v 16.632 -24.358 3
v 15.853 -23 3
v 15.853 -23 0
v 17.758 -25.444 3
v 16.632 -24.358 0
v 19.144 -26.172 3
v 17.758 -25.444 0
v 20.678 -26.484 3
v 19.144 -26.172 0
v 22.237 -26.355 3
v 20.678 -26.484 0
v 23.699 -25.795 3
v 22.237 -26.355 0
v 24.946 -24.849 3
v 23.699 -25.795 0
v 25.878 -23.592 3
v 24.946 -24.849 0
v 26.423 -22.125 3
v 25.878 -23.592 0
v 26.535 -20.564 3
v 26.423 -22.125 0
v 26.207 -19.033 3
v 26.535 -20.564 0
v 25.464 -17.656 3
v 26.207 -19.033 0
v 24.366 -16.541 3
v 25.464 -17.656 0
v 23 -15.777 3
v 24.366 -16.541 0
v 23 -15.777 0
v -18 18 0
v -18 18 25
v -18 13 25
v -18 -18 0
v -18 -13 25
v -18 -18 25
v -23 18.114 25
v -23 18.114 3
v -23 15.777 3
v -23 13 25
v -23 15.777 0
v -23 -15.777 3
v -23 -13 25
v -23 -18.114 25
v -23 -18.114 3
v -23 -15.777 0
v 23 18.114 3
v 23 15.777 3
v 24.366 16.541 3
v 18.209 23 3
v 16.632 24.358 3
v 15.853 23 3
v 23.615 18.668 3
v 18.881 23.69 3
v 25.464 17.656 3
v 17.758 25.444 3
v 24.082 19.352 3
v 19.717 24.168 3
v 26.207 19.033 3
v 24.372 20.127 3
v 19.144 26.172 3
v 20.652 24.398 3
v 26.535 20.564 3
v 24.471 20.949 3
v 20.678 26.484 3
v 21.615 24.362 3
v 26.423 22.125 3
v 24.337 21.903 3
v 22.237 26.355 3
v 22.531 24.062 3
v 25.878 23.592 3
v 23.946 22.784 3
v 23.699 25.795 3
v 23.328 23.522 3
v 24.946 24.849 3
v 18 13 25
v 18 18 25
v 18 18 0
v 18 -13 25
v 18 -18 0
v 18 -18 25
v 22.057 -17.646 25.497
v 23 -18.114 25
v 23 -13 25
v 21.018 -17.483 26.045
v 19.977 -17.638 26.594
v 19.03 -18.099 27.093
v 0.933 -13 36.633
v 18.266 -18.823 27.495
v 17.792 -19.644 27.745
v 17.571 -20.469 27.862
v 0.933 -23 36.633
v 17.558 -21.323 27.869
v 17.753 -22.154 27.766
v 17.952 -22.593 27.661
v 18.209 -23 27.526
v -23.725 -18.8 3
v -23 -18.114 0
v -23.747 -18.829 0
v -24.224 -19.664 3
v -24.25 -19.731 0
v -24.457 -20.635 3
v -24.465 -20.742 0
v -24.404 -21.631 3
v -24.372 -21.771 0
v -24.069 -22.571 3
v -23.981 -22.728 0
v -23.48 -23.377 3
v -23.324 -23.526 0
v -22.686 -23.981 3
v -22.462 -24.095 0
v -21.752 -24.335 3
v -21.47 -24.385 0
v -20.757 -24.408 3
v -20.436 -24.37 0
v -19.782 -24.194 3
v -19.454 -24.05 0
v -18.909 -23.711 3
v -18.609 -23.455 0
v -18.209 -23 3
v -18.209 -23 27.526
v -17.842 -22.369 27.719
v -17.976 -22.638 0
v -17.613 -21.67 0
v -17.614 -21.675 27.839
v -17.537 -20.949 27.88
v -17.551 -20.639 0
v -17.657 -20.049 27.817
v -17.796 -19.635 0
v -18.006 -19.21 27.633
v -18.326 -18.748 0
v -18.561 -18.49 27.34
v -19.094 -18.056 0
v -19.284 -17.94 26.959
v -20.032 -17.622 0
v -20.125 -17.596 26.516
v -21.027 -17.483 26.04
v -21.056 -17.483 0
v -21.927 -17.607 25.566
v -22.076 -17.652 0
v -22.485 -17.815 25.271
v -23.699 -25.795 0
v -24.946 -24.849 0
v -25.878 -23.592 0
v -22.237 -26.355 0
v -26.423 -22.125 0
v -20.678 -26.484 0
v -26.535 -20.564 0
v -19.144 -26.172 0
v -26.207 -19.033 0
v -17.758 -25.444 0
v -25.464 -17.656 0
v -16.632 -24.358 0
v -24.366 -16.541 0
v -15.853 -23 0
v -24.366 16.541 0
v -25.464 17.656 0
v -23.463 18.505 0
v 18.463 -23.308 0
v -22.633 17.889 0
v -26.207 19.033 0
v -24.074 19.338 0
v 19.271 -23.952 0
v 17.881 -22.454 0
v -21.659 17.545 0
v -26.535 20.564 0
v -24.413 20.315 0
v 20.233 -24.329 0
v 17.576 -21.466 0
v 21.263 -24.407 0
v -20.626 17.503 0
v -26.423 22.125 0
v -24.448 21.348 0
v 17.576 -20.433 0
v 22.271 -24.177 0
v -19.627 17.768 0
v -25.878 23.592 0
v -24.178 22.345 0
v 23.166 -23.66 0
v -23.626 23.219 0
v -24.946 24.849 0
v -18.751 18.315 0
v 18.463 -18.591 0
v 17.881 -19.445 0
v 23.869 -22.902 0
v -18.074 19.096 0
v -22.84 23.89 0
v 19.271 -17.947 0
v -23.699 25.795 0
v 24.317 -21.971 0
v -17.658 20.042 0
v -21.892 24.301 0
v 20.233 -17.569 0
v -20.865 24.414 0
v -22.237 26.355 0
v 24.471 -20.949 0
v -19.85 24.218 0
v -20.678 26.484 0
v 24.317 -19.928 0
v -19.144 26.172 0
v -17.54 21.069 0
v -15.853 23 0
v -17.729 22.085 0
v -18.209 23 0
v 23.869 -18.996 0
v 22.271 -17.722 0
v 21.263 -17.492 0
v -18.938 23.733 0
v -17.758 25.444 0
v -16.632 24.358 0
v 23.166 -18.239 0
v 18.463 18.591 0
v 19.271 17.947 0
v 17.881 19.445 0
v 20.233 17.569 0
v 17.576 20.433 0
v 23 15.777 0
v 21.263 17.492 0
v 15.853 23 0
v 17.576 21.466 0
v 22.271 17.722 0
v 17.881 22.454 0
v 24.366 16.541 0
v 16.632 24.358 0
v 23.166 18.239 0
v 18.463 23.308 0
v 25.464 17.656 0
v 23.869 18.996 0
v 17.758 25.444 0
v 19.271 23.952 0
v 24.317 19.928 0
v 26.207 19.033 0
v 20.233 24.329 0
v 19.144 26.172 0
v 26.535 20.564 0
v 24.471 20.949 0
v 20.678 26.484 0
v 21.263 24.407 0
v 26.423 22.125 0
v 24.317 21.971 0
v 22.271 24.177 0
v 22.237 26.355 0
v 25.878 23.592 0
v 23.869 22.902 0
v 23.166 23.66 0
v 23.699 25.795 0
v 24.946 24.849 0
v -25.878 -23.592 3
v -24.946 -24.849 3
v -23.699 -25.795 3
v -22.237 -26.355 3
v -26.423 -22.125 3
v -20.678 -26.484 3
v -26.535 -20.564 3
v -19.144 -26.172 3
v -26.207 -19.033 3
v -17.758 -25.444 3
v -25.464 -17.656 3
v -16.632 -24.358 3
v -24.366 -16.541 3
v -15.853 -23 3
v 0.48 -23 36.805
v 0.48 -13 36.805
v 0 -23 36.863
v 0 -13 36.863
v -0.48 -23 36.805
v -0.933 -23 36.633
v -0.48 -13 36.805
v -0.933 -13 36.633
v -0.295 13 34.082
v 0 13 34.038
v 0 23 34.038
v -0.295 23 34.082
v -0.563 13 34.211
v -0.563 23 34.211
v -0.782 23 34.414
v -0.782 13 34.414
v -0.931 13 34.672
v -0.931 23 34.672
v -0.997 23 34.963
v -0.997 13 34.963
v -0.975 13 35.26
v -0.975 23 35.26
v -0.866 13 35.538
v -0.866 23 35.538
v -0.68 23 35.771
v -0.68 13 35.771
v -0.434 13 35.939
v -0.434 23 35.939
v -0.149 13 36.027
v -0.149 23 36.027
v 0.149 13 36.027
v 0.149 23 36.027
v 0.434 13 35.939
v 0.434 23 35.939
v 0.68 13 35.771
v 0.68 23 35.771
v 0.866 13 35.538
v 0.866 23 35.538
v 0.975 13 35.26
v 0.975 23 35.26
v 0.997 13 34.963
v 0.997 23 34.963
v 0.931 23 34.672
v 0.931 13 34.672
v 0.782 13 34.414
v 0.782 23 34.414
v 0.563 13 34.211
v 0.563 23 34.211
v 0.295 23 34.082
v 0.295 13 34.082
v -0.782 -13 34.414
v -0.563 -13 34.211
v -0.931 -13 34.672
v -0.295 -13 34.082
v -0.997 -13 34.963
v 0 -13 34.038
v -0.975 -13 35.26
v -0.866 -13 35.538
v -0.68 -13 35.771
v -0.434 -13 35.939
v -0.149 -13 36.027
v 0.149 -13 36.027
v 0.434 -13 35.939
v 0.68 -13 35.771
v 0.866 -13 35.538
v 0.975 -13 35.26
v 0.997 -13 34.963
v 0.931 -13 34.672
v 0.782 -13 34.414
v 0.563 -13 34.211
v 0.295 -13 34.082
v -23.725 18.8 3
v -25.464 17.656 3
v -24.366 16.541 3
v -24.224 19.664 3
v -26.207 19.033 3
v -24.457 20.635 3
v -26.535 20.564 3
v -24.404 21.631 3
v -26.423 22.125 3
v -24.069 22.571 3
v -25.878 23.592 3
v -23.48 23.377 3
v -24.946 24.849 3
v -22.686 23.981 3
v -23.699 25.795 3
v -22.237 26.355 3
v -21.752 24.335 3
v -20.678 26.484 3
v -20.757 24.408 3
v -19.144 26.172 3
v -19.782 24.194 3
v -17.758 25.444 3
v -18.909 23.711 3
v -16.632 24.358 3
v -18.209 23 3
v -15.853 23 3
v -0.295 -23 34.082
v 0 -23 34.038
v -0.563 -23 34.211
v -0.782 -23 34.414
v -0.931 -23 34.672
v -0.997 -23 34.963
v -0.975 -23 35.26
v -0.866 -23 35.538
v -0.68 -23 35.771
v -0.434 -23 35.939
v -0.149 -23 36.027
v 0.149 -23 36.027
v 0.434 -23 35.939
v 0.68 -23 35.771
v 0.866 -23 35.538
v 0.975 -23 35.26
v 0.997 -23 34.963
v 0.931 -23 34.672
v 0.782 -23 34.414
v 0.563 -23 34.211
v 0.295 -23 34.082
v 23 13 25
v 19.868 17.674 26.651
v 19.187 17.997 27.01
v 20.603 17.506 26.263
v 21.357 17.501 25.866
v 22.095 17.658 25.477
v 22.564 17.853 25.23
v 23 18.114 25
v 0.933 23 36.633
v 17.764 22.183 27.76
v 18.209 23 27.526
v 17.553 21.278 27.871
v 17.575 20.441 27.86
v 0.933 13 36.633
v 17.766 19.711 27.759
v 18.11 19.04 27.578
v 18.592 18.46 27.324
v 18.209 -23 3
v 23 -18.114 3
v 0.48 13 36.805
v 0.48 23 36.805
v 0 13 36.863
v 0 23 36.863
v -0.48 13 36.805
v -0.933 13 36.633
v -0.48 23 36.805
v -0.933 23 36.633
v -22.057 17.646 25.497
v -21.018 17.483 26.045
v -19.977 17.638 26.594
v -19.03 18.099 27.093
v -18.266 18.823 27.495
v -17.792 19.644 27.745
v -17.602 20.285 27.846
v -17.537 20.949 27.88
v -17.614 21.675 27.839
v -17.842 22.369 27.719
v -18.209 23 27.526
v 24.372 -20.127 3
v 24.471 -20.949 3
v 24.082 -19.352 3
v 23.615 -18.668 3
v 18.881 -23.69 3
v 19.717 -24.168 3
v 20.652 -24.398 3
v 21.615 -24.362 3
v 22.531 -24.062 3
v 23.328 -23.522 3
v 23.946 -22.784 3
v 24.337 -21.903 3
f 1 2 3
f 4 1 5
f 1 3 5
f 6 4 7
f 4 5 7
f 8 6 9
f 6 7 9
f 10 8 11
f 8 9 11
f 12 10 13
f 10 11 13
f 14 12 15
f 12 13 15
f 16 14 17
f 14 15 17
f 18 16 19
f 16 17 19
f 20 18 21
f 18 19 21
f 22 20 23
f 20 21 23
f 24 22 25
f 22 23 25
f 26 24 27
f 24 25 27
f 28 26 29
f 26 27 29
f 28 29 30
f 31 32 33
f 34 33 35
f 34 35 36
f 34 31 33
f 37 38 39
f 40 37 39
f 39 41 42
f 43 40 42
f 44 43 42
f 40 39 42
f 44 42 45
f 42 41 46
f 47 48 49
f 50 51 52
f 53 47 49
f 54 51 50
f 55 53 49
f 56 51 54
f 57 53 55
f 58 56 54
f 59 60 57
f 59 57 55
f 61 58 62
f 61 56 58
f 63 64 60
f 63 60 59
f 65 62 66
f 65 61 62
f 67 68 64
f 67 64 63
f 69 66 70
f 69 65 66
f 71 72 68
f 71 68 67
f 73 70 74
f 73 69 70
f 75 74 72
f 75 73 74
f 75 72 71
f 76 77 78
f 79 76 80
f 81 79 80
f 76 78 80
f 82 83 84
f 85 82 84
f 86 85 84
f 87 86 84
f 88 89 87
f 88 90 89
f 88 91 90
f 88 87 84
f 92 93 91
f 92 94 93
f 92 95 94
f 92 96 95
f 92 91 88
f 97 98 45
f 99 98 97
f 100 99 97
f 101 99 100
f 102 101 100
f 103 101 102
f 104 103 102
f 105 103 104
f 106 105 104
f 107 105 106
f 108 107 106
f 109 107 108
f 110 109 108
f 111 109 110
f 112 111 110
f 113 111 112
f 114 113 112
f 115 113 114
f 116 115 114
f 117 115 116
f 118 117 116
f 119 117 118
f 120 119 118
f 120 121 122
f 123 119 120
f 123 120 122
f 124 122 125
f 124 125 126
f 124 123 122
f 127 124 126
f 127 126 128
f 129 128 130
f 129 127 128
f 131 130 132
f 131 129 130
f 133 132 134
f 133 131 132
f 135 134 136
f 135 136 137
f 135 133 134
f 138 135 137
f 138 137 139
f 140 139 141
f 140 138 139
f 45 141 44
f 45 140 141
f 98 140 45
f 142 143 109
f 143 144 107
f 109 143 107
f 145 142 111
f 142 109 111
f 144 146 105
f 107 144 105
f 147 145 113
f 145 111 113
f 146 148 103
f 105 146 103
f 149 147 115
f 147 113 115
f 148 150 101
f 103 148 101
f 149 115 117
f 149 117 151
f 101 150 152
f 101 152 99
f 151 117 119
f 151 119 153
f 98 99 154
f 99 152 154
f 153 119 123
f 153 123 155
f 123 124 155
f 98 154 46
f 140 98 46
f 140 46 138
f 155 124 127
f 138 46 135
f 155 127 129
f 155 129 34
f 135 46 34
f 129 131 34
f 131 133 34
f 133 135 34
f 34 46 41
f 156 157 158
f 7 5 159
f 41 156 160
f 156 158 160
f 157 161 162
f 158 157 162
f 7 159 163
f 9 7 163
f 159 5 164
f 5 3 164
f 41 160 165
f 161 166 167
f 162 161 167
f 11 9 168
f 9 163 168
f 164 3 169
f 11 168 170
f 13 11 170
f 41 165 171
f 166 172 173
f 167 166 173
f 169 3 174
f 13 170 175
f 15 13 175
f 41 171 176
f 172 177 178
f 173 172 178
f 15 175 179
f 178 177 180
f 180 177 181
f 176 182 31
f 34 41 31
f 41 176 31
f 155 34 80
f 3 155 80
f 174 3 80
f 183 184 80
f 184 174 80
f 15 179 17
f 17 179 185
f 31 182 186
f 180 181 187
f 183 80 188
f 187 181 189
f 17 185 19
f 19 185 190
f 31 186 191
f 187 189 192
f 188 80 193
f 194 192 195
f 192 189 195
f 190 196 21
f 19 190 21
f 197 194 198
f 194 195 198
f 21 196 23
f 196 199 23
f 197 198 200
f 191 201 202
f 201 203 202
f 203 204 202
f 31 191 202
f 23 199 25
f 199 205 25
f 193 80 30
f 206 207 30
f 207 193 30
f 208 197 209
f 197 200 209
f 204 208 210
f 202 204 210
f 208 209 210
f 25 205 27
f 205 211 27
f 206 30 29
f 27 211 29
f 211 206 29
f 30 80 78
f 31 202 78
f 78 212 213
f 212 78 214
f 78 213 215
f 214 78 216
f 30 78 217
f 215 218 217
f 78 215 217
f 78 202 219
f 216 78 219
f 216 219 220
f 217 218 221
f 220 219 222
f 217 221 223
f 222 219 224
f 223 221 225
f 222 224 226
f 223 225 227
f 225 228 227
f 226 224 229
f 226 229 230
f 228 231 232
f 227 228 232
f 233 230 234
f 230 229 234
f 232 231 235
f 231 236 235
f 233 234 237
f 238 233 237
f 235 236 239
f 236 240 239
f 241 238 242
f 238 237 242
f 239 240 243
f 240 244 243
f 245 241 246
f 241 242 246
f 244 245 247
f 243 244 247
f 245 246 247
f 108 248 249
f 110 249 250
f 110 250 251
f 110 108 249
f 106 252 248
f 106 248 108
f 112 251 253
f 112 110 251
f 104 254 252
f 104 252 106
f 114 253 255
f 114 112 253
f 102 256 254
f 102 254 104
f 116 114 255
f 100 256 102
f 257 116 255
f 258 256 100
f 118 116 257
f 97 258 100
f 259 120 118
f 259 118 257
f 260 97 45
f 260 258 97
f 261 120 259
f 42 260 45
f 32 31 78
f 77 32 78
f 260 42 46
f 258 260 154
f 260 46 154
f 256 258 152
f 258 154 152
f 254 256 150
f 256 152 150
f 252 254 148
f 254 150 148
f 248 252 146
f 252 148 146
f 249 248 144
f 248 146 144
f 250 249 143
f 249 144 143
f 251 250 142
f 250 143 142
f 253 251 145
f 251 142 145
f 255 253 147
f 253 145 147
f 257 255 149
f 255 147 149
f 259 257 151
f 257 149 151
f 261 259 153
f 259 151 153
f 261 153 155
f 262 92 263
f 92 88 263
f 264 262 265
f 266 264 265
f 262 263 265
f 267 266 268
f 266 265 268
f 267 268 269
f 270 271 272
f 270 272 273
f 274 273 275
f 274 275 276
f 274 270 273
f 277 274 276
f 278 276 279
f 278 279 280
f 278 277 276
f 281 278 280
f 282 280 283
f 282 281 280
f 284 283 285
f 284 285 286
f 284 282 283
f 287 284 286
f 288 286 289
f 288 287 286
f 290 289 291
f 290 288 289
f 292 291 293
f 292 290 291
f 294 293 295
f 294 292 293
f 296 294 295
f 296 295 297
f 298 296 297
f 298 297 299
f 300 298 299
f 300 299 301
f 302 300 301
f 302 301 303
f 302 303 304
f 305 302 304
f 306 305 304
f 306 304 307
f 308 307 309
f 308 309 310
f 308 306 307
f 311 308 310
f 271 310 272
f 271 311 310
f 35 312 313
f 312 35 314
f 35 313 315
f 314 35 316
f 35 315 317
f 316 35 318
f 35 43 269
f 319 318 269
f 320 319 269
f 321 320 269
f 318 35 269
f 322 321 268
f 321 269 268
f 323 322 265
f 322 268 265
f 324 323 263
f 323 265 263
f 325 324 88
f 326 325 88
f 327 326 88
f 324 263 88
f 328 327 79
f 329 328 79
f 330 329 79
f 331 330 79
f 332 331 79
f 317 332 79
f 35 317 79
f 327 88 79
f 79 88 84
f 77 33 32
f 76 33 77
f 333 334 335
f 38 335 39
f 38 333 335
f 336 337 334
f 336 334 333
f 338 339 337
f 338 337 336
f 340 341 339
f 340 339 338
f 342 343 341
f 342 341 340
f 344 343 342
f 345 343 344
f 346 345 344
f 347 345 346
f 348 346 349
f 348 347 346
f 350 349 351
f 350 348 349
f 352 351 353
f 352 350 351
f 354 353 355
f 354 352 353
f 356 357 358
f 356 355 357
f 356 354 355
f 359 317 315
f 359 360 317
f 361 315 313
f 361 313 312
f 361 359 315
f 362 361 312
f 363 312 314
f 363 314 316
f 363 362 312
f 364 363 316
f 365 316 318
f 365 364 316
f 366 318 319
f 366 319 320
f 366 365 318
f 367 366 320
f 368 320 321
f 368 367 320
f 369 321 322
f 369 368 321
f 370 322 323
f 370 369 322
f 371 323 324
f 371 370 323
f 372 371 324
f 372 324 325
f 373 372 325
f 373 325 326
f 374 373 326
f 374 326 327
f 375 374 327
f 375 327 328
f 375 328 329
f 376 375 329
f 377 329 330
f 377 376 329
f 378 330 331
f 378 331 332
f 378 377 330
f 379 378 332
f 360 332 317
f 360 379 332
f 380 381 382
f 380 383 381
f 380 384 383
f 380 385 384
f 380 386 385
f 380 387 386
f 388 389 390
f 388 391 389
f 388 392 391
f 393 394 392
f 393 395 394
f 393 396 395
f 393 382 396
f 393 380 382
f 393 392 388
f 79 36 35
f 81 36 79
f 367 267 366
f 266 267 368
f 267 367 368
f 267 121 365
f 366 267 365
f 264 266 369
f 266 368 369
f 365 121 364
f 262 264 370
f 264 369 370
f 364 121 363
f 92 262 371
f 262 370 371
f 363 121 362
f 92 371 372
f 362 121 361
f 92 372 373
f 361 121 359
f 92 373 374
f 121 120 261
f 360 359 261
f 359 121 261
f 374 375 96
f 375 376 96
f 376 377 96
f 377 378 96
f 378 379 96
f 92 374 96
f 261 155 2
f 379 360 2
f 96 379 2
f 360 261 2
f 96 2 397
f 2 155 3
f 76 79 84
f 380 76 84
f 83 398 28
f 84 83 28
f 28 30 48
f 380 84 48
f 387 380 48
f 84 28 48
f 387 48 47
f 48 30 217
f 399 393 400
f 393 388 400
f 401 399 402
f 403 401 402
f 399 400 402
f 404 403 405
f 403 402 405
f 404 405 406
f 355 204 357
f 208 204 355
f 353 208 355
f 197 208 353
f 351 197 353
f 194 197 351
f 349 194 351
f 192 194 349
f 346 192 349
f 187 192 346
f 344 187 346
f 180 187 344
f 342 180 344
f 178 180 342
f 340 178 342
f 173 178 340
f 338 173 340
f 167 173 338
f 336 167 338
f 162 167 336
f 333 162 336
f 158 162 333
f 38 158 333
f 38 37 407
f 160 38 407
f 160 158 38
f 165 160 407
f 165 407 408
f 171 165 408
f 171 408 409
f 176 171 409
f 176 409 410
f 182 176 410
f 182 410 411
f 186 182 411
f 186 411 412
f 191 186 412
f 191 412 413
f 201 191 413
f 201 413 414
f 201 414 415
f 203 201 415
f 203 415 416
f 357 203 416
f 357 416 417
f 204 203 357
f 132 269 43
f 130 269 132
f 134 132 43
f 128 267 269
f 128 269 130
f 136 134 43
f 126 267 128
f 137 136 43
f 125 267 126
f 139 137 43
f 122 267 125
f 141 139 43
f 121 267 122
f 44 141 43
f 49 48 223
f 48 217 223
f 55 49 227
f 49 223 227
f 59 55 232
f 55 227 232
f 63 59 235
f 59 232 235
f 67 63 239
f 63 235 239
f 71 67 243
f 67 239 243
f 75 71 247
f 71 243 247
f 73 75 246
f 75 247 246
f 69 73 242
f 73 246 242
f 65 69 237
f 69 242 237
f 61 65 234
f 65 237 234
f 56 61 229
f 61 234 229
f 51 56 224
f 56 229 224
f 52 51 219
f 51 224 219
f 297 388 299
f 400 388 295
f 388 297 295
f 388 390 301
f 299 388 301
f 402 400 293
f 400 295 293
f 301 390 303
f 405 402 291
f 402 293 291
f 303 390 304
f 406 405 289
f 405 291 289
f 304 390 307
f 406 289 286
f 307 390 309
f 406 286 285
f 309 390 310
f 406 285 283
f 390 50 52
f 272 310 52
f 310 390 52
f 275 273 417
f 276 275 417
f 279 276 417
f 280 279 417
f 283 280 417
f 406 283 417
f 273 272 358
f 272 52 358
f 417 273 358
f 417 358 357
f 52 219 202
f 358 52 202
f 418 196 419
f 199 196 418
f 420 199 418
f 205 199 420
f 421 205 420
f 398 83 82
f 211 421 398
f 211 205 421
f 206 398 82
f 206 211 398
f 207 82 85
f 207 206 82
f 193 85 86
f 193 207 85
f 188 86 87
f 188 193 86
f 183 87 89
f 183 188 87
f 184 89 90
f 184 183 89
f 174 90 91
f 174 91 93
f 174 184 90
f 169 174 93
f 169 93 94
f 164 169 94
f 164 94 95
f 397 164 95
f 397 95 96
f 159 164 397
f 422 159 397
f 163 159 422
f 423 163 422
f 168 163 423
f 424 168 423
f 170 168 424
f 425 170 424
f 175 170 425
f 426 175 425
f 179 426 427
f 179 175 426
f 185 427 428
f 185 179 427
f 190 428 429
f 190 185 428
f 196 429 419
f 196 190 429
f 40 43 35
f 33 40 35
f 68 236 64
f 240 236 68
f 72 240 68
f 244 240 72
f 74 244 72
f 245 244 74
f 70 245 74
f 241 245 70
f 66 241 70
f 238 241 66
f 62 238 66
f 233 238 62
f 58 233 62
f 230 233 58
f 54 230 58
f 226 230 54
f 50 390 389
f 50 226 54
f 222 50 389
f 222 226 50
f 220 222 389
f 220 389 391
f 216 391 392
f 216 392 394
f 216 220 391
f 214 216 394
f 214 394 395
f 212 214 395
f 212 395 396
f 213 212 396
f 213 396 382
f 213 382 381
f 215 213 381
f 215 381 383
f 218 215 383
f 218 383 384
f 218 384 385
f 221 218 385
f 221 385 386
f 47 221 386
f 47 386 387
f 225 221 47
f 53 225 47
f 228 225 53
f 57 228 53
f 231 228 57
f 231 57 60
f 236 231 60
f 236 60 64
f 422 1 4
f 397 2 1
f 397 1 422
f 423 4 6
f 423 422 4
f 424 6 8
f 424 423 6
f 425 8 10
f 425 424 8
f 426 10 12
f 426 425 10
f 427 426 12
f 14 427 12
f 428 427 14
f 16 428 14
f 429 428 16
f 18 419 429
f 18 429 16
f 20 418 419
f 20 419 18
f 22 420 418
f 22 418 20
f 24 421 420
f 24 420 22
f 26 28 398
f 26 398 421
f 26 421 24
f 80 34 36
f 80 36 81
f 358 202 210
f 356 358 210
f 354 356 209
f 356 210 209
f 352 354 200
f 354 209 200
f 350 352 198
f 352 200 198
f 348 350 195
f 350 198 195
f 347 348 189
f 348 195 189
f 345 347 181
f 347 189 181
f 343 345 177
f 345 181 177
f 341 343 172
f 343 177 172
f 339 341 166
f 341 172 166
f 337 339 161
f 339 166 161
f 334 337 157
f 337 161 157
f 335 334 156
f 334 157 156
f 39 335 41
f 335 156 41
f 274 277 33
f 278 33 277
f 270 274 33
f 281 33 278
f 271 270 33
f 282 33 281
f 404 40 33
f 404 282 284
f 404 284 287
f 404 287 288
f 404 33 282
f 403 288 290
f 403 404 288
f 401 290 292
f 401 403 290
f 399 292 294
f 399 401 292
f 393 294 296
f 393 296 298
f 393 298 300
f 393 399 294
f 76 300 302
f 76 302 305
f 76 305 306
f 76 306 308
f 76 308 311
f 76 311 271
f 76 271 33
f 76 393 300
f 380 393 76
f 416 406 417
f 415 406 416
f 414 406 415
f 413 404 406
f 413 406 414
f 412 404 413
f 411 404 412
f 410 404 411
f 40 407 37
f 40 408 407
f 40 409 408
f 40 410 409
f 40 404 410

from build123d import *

# Parameters (mm, degrees)
F0_R      = 1.65
F1_DEPTH  = 25
F4_DEPTH  = 23
F7_DEPTH  = 13
F5_R      = 3.466922
F8_DEPTH  = 36
F6_R      = 5.544206
F6_R_2    = 3.466922
F9_DEPTH  = 3
F2_W      = 36
F2_H      = 36
F10_DEPTH = 25
F11_R     = 2


with BuildPart() as f1:
    # F0 (on Top) → F1 (new body)
    with BuildSketch(Plane.XY):
        Polygon((23, 23), (0, 23), (-23, 23), (-23, 0), (-23, -23), (0, -23), (23, -23), (23, 0), align=None)
        with Locations((-20.221745, -20.221745)):
            Circle(F0_R, mode=Mode.SUBTRACT)
        with Locations((20.221745, -20.221745)):
            Circle(F0_R, mode=Mode.SUBTRACT)
        with Locations((-20.221745, 20.221745)):
            Circle(F0_R, mode=Mode.SUBTRACT)
        with Locations((20.221745, 20.221745)):
            Circle(F0_R, mode=Mode.SUBTRACT)
    extrude(amount=F1_DEPTH)

    # F3 (on Front) → F4 (join, symmetric)
    with BuildSketch(Plane.XZ):
        Polygon((-23, 25), (0, 25), (23, 25), (0, 37.124356), align=None)
        with BuildLine():
            ThreePointArc((0, 36.037711), (1, 35.037711), (0, 34.037711))
            ThreePointArc((0, 34.037711), (-1, 35.037711), (0, 36.037711))
        make_face(mode=Mode.SUBTRACT)
    extrude(amount=F4_DEPTH, both=True)

    # F3 (on Front) → F7 (cut, symmetric)
    with BuildSketch(Plane.XZ):
        Polygon((-23, 25), (0, 25), (23, 25), (0, 37.124356), align=None)
        with BuildLine():
            ThreePointArc((0, 36.037711), (1, 35.037711), (0, 34.037711))
            ThreePointArc((0, 34.037711), (-1, 35.037711), (0, 36.037711))
        make_face(mode=Mode.SUBTRACT)
    extrude(amount=F7_DEPTH, both=True, mode=Mode.SUBTRACT)

    # F5 (on Top) → F8 (cut)
    with BuildSketch(Plane.XY):
        with Locations((-21.004396, 20.949436)):
            Circle(F5_R)
        with Locations((21.004396, 20.949436)):
            Circle(F5_R)
        with Locations((21.004396, -20.949436)):
            Circle(F5_R)
        with Locations((-21.004396, -20.949436)):
            Circle(F5_R)
    extrude(amount=F8_DEPTH, mode=Mode.SUBTRACT)

    # F6 (on Top) → F9 (join)
    with BuildSketch(Plane.XY):
        with Locations((-21.004396, 20.949436)):
            Circle(F6_R)
        with Locations((-21.004396, 20.949436)):
            Circle(F6_R_2, mode=Mode.SUBTRACT)
        with Locations((21.004396, 20.949436)):
            Circle(F6_R)
        with Locations((21.004396, 20.949436)):
            Circle(F6_R_2, mode=Mode.SUBTRACT)
        with Locations((21.004396, -20.949436)):
            Circle(F6_R)
        with Locations((21.004396, -20.949436)):
            Circle(F6_R_2, mode=Mode.SUBTRACT)
        with Locations((-21.004396, -20.949436)):
            Circle(F6_R)
        with Locations((-21.004396, -20.949436)):
            Circle(F6_R_2, mode=Mode.SUBTRACT)
    extrude(amount=F9_DEPTH)

    # F2 (on face) → F10 (cut)
    with BuildSketch(Plane(origin=(0, 0, 0), x_dir=(1, 0, 0), z_dir=(0, 0, -1))):
        Rectangle(F2_W, F2_H)
    extrude(amount=-F10_DEPTH, mode=Mode.SUBTRACT)

    # F11
    f11_edges = [f1.edges().sort_by_distance(p)[0] for p in [
        (0, 18, 37.124356),
        (0, -18, 37.124356),
    ]]
    fillet(f11_edges, radius=F11_R)


solid = f1.part
